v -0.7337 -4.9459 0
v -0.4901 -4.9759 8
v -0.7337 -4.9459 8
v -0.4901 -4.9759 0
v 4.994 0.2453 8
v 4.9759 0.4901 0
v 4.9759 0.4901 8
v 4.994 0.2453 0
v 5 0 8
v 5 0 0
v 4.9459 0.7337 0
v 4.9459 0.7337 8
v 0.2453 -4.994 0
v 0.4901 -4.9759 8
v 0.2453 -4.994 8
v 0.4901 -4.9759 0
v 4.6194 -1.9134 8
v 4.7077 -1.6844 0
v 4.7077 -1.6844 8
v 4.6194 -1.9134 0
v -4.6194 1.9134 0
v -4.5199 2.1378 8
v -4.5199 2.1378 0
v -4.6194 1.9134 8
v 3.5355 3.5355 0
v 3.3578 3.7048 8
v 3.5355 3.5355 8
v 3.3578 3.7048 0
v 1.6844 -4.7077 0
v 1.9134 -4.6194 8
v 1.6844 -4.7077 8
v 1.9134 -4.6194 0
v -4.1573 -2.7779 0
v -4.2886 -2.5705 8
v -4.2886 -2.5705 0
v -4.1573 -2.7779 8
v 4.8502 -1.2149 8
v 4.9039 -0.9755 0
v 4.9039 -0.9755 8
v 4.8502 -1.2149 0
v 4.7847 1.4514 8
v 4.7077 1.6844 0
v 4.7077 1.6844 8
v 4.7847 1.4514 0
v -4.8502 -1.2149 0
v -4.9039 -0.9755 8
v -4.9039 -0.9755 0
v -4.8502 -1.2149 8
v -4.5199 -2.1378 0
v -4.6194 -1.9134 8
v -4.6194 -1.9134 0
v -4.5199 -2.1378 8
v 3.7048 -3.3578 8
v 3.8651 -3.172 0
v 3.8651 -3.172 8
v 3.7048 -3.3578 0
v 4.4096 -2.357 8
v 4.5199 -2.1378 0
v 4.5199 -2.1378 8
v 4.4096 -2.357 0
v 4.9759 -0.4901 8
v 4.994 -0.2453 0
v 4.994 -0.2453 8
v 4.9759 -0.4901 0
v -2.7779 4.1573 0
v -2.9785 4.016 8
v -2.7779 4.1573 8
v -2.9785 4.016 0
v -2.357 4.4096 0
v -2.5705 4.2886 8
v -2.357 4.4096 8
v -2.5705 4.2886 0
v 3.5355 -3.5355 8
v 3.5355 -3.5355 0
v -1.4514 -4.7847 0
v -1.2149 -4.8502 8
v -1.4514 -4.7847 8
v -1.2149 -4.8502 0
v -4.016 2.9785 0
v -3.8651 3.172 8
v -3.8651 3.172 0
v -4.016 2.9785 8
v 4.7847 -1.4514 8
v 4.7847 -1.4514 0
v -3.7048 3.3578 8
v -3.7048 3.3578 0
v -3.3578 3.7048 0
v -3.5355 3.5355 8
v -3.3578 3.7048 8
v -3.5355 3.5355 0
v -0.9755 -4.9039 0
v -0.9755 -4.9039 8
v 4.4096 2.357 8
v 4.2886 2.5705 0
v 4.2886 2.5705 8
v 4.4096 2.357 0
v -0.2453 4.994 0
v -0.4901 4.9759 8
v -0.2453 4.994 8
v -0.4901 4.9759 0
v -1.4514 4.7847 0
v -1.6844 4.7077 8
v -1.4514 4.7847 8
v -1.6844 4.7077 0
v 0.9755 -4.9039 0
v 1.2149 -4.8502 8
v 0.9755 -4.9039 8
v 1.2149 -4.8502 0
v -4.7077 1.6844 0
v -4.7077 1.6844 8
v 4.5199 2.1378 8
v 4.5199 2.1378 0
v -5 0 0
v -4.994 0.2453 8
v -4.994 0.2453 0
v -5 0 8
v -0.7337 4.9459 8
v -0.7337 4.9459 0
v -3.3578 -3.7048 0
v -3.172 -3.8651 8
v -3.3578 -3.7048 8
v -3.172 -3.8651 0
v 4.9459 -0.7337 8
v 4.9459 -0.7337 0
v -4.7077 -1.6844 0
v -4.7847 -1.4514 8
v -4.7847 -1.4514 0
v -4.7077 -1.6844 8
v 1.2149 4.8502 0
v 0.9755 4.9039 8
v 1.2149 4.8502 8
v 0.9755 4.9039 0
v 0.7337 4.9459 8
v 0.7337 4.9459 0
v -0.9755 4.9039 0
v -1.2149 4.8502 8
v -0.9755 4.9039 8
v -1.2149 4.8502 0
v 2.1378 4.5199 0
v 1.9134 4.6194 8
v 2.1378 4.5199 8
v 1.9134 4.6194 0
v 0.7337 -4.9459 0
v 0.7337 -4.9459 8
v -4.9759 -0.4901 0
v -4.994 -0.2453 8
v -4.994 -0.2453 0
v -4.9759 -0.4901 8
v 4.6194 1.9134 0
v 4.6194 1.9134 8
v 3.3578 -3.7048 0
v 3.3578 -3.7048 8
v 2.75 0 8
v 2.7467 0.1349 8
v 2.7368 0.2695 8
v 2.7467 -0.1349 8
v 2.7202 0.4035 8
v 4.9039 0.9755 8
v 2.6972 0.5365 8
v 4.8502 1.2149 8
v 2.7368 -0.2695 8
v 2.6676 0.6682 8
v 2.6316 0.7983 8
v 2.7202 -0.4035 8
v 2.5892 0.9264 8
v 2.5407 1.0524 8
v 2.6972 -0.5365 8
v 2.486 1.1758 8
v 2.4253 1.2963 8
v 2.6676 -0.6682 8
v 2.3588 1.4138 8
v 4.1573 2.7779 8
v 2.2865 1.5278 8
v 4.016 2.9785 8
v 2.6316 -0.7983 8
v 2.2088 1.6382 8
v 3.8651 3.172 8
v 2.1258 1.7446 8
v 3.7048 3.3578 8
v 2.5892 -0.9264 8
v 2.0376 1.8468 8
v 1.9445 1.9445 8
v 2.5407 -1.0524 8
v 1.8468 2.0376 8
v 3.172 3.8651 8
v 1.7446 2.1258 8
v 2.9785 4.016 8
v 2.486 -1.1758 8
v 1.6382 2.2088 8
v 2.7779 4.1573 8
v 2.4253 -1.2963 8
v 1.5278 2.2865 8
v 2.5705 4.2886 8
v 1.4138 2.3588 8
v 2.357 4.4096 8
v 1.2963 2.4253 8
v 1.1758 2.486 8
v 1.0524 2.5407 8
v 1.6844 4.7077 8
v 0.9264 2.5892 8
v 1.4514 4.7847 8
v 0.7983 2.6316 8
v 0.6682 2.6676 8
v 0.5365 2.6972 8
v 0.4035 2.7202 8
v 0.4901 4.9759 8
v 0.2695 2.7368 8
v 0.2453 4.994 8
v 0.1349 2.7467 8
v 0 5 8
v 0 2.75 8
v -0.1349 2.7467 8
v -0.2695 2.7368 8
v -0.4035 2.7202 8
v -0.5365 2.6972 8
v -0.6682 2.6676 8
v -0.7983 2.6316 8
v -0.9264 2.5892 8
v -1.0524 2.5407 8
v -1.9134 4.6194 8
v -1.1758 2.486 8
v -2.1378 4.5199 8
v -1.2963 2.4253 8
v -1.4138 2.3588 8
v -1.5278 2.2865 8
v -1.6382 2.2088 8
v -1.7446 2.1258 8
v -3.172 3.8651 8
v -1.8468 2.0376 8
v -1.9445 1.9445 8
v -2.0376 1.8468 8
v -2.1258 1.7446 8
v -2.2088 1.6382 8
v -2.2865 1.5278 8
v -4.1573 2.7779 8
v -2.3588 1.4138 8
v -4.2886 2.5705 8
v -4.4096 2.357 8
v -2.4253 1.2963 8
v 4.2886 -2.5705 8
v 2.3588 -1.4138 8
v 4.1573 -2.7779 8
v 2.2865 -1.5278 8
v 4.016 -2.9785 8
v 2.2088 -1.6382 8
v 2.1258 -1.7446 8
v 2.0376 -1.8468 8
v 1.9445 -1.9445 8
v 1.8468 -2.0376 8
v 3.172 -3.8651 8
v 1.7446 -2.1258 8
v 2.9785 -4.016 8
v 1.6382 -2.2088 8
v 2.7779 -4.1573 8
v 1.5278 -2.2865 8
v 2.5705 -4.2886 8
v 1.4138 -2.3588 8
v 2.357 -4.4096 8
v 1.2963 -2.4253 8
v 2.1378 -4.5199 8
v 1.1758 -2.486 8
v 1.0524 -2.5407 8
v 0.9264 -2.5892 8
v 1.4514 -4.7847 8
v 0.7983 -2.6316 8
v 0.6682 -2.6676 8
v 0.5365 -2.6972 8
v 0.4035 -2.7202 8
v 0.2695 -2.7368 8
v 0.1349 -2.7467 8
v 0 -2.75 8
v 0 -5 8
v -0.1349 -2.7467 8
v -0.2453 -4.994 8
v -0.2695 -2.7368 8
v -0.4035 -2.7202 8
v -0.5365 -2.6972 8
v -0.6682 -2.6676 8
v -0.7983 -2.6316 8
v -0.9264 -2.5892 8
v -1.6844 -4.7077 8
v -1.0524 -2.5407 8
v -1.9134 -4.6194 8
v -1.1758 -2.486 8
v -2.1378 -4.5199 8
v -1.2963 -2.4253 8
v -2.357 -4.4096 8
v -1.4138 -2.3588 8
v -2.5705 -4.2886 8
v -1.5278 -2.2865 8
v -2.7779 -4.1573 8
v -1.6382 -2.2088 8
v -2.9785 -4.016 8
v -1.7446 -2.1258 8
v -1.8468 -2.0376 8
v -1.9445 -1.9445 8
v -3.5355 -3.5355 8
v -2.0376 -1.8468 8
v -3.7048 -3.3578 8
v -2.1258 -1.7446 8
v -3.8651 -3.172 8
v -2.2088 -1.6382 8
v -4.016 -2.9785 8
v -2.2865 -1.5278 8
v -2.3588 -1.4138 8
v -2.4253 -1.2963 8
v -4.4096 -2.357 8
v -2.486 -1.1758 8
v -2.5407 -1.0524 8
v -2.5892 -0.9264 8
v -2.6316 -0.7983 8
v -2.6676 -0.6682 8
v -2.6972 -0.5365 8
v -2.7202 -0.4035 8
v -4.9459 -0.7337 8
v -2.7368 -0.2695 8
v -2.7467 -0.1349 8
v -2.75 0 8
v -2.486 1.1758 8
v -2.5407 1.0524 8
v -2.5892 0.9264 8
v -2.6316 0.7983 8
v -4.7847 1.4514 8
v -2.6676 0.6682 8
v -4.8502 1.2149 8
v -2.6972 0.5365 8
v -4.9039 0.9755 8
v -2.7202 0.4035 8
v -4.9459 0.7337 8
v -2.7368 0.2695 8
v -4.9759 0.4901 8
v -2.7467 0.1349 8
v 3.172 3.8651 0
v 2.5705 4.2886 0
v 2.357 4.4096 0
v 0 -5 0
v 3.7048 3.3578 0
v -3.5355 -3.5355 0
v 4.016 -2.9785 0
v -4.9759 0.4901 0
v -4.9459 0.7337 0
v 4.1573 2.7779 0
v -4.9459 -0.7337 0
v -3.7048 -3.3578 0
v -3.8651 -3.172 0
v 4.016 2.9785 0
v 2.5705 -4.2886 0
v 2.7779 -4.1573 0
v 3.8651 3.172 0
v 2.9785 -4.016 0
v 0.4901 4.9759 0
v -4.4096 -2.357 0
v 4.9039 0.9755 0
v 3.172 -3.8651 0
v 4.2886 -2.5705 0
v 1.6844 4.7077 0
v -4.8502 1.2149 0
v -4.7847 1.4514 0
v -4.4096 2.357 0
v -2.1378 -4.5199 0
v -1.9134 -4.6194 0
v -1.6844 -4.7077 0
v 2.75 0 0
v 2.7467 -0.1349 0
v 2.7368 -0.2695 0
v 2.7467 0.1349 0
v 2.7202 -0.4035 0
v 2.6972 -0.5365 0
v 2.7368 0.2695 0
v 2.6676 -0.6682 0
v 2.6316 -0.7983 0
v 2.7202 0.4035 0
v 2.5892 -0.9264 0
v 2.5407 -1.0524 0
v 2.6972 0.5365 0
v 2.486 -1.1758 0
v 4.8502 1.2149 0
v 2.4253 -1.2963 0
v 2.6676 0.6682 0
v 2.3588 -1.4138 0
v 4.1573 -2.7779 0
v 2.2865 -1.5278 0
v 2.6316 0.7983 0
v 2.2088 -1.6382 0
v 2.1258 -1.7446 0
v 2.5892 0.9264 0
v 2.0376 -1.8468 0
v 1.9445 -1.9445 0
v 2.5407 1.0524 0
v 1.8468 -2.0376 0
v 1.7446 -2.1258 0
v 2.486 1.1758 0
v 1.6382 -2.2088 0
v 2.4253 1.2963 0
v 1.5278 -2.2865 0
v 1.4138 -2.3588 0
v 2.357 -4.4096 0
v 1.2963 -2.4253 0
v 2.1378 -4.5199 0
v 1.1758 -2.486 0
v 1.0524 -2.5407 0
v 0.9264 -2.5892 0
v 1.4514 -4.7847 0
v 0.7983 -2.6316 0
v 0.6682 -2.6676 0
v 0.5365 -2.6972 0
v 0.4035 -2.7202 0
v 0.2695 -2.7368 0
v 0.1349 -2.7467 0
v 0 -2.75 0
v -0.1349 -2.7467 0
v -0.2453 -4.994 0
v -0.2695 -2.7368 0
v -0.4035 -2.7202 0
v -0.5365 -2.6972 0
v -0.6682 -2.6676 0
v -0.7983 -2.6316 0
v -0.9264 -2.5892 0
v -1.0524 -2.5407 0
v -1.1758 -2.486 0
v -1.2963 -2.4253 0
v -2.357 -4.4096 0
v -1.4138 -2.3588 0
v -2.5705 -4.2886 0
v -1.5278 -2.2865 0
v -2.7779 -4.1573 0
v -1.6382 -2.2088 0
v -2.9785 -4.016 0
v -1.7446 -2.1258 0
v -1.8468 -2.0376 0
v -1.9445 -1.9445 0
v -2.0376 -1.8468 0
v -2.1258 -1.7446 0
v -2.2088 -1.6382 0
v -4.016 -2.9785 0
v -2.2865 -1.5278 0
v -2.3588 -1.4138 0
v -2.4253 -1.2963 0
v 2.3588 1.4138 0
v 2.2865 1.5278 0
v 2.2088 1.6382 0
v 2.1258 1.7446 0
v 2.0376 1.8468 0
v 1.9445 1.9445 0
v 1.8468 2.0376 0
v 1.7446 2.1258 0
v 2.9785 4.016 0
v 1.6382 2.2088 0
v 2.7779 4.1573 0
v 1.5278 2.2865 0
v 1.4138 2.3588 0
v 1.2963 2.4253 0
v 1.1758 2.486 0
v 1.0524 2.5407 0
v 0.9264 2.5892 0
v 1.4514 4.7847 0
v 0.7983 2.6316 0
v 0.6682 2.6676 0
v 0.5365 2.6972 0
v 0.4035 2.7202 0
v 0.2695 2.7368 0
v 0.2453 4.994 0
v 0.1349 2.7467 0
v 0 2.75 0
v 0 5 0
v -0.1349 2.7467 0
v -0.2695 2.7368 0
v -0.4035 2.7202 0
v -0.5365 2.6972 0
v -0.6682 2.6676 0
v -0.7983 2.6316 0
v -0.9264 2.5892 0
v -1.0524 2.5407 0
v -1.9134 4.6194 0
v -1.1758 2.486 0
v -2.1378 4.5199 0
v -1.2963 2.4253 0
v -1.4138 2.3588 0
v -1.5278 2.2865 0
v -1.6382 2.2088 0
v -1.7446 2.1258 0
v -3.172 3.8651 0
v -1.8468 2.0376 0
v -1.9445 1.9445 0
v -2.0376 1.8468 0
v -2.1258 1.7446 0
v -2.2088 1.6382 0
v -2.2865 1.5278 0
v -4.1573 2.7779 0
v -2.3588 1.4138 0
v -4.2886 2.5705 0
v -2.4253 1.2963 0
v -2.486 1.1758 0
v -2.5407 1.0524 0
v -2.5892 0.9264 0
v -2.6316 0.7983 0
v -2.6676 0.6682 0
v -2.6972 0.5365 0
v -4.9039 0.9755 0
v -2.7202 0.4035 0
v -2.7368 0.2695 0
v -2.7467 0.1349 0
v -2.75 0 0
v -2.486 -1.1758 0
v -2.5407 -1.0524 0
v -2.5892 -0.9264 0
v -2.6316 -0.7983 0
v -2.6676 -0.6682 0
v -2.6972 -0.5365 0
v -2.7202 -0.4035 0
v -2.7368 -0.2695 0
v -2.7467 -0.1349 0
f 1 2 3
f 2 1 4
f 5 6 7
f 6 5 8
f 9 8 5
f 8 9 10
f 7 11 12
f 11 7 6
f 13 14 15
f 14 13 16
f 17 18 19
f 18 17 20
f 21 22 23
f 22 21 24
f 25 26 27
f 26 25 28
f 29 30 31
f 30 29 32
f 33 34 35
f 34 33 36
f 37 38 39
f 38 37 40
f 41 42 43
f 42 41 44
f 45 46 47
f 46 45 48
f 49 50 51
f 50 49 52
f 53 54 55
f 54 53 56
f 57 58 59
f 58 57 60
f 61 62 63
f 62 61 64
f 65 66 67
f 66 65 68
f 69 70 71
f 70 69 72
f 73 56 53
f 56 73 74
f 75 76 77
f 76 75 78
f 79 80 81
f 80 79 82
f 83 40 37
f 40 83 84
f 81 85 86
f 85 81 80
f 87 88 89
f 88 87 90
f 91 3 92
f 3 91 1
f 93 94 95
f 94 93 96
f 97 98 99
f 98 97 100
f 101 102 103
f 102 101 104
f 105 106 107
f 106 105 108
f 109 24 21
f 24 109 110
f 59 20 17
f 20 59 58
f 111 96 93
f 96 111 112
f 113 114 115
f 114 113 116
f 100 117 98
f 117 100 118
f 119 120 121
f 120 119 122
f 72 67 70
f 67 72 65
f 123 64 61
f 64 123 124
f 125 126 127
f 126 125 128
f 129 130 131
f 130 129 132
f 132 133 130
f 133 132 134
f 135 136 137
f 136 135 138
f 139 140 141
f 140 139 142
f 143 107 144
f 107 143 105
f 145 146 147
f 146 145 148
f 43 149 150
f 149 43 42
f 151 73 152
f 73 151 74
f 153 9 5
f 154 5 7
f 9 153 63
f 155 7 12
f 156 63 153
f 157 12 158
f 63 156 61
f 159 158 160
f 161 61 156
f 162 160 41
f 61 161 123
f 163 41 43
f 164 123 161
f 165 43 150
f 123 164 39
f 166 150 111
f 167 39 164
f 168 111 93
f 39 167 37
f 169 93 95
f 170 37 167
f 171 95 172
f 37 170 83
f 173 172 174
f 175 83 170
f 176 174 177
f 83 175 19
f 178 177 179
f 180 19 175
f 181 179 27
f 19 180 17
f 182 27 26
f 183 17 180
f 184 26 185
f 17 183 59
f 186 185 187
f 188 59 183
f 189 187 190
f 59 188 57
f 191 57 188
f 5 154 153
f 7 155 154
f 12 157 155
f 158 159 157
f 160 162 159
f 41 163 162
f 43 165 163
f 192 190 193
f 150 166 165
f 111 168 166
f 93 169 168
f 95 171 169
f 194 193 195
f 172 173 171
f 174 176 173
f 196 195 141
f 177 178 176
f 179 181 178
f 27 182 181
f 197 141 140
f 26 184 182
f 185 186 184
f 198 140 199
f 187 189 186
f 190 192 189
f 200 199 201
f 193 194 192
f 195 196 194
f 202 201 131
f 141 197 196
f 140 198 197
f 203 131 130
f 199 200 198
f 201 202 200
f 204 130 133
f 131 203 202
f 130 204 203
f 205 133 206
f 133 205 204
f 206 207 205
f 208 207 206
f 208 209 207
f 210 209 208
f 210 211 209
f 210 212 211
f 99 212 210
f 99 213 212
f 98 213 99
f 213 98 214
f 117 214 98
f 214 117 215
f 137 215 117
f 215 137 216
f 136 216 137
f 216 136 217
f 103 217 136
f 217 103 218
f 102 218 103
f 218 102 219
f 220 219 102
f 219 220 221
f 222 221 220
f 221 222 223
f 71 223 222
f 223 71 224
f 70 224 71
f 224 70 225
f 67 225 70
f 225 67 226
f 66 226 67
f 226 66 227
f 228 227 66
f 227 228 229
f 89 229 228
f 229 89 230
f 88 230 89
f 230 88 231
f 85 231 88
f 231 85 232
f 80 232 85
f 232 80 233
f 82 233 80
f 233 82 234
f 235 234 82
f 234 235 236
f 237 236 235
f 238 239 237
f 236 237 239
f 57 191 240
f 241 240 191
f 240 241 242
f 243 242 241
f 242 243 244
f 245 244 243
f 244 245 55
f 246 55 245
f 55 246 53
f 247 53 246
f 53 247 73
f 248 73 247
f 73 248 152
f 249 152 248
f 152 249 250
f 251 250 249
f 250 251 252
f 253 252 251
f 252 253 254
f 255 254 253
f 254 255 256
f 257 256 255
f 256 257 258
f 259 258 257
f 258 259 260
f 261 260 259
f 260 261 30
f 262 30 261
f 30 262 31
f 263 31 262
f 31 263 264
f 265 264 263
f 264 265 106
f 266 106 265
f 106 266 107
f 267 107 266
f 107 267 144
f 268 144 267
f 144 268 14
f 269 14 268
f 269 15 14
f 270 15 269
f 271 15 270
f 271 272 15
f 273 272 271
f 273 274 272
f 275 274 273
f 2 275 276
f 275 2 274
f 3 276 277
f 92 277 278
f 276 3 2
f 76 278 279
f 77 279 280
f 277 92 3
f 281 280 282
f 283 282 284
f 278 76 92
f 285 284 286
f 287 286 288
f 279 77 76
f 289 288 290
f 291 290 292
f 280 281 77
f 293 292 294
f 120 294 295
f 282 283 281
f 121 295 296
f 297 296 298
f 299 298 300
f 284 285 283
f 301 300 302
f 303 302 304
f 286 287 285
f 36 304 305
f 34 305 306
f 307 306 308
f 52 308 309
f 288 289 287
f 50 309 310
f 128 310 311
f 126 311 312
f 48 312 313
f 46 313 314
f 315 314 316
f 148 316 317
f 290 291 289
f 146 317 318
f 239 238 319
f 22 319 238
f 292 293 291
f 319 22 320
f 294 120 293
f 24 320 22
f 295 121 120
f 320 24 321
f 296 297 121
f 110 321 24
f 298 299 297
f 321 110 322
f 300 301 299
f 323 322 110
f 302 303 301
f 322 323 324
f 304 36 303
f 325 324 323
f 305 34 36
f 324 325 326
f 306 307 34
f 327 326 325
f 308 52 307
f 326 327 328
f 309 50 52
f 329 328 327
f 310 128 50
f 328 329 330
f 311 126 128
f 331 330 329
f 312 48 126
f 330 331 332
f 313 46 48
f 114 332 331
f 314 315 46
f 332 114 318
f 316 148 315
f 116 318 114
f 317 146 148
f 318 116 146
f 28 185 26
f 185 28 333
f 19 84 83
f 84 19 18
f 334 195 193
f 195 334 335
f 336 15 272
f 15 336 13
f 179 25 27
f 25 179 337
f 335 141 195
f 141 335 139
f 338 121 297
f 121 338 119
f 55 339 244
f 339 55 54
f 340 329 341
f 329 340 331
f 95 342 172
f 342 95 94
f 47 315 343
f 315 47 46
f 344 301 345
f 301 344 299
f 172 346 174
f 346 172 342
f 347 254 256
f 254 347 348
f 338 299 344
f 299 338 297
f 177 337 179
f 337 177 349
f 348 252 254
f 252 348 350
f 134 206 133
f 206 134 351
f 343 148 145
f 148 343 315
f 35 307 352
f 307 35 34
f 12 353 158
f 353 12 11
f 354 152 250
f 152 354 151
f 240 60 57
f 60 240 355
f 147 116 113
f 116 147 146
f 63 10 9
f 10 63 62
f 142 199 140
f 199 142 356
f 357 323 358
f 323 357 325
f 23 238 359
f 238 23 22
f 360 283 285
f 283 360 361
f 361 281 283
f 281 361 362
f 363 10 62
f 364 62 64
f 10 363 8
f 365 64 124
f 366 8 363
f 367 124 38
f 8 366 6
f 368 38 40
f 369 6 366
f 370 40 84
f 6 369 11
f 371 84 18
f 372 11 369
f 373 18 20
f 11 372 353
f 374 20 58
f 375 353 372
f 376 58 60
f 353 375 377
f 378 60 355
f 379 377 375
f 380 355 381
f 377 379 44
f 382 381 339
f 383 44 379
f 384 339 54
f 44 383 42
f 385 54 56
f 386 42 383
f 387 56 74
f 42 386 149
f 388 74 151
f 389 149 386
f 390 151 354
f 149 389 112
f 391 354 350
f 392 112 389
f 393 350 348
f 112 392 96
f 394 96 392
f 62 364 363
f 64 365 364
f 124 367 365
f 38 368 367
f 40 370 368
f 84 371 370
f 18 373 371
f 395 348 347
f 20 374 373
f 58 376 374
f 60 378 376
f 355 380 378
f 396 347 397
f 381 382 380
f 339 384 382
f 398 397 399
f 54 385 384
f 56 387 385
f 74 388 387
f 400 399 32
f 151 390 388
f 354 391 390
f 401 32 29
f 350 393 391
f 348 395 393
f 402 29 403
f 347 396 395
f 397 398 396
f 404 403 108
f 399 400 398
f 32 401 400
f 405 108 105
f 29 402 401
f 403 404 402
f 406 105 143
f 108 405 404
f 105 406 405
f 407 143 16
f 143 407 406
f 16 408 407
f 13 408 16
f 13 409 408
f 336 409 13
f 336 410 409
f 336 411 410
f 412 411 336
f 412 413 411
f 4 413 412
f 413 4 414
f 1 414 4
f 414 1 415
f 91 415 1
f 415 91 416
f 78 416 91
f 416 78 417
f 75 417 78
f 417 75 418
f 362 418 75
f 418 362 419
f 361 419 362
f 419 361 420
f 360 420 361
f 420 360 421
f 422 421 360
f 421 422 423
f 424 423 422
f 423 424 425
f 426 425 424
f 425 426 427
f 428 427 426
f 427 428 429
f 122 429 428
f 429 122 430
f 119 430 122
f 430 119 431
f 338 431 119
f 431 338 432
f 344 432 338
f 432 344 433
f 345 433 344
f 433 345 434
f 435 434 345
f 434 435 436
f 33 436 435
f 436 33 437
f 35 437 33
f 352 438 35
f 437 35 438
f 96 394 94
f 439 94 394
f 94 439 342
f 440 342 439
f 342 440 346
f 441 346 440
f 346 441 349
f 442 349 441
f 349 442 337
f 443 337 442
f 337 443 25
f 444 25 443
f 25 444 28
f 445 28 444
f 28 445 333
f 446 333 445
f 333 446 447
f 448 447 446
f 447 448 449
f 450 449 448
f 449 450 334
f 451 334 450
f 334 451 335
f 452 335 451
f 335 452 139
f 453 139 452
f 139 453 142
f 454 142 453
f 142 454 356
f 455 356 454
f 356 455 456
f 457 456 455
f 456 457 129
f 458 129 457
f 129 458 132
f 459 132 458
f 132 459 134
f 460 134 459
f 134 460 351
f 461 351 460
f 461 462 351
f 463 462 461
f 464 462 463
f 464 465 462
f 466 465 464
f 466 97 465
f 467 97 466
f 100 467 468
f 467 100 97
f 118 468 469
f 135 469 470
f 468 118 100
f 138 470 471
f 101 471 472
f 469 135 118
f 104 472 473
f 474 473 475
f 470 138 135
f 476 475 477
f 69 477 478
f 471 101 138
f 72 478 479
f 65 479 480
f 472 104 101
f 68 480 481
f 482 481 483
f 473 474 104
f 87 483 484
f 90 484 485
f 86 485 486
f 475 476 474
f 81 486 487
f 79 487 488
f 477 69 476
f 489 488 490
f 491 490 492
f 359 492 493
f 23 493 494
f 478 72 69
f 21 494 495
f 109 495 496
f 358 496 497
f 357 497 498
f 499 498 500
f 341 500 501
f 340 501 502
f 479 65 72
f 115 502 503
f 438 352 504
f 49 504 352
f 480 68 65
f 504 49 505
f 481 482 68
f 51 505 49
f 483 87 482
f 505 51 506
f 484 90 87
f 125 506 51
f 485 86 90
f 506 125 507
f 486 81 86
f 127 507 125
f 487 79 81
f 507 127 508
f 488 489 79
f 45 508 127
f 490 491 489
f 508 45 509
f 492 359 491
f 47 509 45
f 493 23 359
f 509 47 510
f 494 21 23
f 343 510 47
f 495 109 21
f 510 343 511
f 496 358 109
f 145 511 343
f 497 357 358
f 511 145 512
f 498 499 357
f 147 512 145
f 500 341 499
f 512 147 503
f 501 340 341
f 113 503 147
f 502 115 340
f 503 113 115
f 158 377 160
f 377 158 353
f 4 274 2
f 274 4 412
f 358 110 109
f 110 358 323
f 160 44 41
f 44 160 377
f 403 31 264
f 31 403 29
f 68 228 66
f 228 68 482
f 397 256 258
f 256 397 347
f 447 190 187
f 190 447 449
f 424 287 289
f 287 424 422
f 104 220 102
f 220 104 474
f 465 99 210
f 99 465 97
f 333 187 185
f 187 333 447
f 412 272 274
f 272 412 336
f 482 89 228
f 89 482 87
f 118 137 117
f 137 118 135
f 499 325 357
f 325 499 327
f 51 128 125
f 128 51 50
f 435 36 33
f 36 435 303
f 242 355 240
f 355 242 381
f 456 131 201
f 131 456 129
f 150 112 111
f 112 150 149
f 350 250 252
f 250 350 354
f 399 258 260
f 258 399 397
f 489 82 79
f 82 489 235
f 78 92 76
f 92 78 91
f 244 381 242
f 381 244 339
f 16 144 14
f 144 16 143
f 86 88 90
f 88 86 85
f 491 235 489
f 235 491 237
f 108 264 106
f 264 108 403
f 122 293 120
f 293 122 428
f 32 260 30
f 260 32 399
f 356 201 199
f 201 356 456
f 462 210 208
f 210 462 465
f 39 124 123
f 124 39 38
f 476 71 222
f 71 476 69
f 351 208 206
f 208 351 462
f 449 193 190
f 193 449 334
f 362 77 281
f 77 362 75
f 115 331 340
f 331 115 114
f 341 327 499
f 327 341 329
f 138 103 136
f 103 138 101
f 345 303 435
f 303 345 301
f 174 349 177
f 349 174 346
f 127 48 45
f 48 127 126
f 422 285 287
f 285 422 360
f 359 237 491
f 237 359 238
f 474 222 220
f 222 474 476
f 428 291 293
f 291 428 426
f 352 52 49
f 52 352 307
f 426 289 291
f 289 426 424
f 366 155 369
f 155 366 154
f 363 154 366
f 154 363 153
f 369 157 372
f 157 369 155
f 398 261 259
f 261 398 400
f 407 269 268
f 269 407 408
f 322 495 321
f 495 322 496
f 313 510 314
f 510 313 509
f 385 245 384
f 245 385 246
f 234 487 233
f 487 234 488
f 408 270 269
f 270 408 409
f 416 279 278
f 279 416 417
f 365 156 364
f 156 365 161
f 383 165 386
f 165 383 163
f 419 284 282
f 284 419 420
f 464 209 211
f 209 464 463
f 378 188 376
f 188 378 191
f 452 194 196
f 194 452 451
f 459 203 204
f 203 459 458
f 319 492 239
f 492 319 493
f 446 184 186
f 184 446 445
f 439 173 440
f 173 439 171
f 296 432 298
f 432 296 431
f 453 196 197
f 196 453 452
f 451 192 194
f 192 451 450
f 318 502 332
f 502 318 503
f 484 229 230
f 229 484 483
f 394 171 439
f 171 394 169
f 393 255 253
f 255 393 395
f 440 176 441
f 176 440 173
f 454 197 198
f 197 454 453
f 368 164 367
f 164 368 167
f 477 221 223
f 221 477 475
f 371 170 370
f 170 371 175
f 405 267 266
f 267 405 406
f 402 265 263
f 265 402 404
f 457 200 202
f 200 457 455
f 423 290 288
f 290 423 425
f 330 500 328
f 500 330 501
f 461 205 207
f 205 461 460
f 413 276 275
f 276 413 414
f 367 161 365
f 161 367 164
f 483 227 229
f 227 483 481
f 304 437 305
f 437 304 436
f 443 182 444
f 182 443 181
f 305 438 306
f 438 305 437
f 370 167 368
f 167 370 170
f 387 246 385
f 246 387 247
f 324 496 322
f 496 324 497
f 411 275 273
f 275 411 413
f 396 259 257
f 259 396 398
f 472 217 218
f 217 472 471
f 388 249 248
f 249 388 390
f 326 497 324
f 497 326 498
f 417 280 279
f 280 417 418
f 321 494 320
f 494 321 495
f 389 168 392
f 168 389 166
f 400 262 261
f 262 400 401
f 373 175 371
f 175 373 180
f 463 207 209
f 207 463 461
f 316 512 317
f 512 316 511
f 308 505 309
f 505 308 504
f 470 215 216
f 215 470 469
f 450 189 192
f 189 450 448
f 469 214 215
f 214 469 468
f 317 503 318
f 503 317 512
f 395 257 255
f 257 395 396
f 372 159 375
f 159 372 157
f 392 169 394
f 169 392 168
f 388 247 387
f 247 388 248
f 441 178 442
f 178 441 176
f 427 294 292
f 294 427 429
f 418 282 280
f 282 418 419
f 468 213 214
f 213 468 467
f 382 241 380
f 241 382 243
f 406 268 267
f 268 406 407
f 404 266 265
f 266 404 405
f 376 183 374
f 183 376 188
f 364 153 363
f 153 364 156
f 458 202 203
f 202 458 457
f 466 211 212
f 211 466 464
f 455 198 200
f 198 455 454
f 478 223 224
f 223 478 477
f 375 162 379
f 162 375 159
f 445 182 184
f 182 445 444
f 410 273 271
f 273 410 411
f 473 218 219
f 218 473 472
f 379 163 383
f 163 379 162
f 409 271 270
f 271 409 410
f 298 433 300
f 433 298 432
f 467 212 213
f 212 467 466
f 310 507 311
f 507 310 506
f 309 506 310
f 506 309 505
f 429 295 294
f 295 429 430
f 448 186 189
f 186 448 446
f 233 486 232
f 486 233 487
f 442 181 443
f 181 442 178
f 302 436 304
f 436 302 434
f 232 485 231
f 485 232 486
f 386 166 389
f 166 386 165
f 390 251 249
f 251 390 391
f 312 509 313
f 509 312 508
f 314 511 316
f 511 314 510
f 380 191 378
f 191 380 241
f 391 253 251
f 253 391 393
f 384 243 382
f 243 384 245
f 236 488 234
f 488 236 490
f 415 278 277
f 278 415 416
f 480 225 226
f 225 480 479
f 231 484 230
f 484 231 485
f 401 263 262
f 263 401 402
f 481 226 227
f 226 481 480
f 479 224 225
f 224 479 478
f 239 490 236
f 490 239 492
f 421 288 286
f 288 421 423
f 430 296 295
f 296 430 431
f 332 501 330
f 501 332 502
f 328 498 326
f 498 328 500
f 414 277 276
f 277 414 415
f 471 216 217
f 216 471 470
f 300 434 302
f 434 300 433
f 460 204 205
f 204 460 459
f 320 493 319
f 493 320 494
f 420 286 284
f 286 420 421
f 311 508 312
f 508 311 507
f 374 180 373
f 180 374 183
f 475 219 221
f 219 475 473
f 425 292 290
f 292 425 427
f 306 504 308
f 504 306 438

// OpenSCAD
// Units: mm. Diameter values are provisional R6 geometry, not measured hardware.
height = 8;
outer_diameter = 10;
bore_diameter = 5.5;
$fn = 128;
assert(height > 0 && outer_diameter > bore_diameter && bore_diameter > 0);
difference() {
    cylinder(h = height, d = outer_diameter);
    translate([0, 0, -0.1]) cylinder(h = height + 0.2, d = bore_diameter);
}
